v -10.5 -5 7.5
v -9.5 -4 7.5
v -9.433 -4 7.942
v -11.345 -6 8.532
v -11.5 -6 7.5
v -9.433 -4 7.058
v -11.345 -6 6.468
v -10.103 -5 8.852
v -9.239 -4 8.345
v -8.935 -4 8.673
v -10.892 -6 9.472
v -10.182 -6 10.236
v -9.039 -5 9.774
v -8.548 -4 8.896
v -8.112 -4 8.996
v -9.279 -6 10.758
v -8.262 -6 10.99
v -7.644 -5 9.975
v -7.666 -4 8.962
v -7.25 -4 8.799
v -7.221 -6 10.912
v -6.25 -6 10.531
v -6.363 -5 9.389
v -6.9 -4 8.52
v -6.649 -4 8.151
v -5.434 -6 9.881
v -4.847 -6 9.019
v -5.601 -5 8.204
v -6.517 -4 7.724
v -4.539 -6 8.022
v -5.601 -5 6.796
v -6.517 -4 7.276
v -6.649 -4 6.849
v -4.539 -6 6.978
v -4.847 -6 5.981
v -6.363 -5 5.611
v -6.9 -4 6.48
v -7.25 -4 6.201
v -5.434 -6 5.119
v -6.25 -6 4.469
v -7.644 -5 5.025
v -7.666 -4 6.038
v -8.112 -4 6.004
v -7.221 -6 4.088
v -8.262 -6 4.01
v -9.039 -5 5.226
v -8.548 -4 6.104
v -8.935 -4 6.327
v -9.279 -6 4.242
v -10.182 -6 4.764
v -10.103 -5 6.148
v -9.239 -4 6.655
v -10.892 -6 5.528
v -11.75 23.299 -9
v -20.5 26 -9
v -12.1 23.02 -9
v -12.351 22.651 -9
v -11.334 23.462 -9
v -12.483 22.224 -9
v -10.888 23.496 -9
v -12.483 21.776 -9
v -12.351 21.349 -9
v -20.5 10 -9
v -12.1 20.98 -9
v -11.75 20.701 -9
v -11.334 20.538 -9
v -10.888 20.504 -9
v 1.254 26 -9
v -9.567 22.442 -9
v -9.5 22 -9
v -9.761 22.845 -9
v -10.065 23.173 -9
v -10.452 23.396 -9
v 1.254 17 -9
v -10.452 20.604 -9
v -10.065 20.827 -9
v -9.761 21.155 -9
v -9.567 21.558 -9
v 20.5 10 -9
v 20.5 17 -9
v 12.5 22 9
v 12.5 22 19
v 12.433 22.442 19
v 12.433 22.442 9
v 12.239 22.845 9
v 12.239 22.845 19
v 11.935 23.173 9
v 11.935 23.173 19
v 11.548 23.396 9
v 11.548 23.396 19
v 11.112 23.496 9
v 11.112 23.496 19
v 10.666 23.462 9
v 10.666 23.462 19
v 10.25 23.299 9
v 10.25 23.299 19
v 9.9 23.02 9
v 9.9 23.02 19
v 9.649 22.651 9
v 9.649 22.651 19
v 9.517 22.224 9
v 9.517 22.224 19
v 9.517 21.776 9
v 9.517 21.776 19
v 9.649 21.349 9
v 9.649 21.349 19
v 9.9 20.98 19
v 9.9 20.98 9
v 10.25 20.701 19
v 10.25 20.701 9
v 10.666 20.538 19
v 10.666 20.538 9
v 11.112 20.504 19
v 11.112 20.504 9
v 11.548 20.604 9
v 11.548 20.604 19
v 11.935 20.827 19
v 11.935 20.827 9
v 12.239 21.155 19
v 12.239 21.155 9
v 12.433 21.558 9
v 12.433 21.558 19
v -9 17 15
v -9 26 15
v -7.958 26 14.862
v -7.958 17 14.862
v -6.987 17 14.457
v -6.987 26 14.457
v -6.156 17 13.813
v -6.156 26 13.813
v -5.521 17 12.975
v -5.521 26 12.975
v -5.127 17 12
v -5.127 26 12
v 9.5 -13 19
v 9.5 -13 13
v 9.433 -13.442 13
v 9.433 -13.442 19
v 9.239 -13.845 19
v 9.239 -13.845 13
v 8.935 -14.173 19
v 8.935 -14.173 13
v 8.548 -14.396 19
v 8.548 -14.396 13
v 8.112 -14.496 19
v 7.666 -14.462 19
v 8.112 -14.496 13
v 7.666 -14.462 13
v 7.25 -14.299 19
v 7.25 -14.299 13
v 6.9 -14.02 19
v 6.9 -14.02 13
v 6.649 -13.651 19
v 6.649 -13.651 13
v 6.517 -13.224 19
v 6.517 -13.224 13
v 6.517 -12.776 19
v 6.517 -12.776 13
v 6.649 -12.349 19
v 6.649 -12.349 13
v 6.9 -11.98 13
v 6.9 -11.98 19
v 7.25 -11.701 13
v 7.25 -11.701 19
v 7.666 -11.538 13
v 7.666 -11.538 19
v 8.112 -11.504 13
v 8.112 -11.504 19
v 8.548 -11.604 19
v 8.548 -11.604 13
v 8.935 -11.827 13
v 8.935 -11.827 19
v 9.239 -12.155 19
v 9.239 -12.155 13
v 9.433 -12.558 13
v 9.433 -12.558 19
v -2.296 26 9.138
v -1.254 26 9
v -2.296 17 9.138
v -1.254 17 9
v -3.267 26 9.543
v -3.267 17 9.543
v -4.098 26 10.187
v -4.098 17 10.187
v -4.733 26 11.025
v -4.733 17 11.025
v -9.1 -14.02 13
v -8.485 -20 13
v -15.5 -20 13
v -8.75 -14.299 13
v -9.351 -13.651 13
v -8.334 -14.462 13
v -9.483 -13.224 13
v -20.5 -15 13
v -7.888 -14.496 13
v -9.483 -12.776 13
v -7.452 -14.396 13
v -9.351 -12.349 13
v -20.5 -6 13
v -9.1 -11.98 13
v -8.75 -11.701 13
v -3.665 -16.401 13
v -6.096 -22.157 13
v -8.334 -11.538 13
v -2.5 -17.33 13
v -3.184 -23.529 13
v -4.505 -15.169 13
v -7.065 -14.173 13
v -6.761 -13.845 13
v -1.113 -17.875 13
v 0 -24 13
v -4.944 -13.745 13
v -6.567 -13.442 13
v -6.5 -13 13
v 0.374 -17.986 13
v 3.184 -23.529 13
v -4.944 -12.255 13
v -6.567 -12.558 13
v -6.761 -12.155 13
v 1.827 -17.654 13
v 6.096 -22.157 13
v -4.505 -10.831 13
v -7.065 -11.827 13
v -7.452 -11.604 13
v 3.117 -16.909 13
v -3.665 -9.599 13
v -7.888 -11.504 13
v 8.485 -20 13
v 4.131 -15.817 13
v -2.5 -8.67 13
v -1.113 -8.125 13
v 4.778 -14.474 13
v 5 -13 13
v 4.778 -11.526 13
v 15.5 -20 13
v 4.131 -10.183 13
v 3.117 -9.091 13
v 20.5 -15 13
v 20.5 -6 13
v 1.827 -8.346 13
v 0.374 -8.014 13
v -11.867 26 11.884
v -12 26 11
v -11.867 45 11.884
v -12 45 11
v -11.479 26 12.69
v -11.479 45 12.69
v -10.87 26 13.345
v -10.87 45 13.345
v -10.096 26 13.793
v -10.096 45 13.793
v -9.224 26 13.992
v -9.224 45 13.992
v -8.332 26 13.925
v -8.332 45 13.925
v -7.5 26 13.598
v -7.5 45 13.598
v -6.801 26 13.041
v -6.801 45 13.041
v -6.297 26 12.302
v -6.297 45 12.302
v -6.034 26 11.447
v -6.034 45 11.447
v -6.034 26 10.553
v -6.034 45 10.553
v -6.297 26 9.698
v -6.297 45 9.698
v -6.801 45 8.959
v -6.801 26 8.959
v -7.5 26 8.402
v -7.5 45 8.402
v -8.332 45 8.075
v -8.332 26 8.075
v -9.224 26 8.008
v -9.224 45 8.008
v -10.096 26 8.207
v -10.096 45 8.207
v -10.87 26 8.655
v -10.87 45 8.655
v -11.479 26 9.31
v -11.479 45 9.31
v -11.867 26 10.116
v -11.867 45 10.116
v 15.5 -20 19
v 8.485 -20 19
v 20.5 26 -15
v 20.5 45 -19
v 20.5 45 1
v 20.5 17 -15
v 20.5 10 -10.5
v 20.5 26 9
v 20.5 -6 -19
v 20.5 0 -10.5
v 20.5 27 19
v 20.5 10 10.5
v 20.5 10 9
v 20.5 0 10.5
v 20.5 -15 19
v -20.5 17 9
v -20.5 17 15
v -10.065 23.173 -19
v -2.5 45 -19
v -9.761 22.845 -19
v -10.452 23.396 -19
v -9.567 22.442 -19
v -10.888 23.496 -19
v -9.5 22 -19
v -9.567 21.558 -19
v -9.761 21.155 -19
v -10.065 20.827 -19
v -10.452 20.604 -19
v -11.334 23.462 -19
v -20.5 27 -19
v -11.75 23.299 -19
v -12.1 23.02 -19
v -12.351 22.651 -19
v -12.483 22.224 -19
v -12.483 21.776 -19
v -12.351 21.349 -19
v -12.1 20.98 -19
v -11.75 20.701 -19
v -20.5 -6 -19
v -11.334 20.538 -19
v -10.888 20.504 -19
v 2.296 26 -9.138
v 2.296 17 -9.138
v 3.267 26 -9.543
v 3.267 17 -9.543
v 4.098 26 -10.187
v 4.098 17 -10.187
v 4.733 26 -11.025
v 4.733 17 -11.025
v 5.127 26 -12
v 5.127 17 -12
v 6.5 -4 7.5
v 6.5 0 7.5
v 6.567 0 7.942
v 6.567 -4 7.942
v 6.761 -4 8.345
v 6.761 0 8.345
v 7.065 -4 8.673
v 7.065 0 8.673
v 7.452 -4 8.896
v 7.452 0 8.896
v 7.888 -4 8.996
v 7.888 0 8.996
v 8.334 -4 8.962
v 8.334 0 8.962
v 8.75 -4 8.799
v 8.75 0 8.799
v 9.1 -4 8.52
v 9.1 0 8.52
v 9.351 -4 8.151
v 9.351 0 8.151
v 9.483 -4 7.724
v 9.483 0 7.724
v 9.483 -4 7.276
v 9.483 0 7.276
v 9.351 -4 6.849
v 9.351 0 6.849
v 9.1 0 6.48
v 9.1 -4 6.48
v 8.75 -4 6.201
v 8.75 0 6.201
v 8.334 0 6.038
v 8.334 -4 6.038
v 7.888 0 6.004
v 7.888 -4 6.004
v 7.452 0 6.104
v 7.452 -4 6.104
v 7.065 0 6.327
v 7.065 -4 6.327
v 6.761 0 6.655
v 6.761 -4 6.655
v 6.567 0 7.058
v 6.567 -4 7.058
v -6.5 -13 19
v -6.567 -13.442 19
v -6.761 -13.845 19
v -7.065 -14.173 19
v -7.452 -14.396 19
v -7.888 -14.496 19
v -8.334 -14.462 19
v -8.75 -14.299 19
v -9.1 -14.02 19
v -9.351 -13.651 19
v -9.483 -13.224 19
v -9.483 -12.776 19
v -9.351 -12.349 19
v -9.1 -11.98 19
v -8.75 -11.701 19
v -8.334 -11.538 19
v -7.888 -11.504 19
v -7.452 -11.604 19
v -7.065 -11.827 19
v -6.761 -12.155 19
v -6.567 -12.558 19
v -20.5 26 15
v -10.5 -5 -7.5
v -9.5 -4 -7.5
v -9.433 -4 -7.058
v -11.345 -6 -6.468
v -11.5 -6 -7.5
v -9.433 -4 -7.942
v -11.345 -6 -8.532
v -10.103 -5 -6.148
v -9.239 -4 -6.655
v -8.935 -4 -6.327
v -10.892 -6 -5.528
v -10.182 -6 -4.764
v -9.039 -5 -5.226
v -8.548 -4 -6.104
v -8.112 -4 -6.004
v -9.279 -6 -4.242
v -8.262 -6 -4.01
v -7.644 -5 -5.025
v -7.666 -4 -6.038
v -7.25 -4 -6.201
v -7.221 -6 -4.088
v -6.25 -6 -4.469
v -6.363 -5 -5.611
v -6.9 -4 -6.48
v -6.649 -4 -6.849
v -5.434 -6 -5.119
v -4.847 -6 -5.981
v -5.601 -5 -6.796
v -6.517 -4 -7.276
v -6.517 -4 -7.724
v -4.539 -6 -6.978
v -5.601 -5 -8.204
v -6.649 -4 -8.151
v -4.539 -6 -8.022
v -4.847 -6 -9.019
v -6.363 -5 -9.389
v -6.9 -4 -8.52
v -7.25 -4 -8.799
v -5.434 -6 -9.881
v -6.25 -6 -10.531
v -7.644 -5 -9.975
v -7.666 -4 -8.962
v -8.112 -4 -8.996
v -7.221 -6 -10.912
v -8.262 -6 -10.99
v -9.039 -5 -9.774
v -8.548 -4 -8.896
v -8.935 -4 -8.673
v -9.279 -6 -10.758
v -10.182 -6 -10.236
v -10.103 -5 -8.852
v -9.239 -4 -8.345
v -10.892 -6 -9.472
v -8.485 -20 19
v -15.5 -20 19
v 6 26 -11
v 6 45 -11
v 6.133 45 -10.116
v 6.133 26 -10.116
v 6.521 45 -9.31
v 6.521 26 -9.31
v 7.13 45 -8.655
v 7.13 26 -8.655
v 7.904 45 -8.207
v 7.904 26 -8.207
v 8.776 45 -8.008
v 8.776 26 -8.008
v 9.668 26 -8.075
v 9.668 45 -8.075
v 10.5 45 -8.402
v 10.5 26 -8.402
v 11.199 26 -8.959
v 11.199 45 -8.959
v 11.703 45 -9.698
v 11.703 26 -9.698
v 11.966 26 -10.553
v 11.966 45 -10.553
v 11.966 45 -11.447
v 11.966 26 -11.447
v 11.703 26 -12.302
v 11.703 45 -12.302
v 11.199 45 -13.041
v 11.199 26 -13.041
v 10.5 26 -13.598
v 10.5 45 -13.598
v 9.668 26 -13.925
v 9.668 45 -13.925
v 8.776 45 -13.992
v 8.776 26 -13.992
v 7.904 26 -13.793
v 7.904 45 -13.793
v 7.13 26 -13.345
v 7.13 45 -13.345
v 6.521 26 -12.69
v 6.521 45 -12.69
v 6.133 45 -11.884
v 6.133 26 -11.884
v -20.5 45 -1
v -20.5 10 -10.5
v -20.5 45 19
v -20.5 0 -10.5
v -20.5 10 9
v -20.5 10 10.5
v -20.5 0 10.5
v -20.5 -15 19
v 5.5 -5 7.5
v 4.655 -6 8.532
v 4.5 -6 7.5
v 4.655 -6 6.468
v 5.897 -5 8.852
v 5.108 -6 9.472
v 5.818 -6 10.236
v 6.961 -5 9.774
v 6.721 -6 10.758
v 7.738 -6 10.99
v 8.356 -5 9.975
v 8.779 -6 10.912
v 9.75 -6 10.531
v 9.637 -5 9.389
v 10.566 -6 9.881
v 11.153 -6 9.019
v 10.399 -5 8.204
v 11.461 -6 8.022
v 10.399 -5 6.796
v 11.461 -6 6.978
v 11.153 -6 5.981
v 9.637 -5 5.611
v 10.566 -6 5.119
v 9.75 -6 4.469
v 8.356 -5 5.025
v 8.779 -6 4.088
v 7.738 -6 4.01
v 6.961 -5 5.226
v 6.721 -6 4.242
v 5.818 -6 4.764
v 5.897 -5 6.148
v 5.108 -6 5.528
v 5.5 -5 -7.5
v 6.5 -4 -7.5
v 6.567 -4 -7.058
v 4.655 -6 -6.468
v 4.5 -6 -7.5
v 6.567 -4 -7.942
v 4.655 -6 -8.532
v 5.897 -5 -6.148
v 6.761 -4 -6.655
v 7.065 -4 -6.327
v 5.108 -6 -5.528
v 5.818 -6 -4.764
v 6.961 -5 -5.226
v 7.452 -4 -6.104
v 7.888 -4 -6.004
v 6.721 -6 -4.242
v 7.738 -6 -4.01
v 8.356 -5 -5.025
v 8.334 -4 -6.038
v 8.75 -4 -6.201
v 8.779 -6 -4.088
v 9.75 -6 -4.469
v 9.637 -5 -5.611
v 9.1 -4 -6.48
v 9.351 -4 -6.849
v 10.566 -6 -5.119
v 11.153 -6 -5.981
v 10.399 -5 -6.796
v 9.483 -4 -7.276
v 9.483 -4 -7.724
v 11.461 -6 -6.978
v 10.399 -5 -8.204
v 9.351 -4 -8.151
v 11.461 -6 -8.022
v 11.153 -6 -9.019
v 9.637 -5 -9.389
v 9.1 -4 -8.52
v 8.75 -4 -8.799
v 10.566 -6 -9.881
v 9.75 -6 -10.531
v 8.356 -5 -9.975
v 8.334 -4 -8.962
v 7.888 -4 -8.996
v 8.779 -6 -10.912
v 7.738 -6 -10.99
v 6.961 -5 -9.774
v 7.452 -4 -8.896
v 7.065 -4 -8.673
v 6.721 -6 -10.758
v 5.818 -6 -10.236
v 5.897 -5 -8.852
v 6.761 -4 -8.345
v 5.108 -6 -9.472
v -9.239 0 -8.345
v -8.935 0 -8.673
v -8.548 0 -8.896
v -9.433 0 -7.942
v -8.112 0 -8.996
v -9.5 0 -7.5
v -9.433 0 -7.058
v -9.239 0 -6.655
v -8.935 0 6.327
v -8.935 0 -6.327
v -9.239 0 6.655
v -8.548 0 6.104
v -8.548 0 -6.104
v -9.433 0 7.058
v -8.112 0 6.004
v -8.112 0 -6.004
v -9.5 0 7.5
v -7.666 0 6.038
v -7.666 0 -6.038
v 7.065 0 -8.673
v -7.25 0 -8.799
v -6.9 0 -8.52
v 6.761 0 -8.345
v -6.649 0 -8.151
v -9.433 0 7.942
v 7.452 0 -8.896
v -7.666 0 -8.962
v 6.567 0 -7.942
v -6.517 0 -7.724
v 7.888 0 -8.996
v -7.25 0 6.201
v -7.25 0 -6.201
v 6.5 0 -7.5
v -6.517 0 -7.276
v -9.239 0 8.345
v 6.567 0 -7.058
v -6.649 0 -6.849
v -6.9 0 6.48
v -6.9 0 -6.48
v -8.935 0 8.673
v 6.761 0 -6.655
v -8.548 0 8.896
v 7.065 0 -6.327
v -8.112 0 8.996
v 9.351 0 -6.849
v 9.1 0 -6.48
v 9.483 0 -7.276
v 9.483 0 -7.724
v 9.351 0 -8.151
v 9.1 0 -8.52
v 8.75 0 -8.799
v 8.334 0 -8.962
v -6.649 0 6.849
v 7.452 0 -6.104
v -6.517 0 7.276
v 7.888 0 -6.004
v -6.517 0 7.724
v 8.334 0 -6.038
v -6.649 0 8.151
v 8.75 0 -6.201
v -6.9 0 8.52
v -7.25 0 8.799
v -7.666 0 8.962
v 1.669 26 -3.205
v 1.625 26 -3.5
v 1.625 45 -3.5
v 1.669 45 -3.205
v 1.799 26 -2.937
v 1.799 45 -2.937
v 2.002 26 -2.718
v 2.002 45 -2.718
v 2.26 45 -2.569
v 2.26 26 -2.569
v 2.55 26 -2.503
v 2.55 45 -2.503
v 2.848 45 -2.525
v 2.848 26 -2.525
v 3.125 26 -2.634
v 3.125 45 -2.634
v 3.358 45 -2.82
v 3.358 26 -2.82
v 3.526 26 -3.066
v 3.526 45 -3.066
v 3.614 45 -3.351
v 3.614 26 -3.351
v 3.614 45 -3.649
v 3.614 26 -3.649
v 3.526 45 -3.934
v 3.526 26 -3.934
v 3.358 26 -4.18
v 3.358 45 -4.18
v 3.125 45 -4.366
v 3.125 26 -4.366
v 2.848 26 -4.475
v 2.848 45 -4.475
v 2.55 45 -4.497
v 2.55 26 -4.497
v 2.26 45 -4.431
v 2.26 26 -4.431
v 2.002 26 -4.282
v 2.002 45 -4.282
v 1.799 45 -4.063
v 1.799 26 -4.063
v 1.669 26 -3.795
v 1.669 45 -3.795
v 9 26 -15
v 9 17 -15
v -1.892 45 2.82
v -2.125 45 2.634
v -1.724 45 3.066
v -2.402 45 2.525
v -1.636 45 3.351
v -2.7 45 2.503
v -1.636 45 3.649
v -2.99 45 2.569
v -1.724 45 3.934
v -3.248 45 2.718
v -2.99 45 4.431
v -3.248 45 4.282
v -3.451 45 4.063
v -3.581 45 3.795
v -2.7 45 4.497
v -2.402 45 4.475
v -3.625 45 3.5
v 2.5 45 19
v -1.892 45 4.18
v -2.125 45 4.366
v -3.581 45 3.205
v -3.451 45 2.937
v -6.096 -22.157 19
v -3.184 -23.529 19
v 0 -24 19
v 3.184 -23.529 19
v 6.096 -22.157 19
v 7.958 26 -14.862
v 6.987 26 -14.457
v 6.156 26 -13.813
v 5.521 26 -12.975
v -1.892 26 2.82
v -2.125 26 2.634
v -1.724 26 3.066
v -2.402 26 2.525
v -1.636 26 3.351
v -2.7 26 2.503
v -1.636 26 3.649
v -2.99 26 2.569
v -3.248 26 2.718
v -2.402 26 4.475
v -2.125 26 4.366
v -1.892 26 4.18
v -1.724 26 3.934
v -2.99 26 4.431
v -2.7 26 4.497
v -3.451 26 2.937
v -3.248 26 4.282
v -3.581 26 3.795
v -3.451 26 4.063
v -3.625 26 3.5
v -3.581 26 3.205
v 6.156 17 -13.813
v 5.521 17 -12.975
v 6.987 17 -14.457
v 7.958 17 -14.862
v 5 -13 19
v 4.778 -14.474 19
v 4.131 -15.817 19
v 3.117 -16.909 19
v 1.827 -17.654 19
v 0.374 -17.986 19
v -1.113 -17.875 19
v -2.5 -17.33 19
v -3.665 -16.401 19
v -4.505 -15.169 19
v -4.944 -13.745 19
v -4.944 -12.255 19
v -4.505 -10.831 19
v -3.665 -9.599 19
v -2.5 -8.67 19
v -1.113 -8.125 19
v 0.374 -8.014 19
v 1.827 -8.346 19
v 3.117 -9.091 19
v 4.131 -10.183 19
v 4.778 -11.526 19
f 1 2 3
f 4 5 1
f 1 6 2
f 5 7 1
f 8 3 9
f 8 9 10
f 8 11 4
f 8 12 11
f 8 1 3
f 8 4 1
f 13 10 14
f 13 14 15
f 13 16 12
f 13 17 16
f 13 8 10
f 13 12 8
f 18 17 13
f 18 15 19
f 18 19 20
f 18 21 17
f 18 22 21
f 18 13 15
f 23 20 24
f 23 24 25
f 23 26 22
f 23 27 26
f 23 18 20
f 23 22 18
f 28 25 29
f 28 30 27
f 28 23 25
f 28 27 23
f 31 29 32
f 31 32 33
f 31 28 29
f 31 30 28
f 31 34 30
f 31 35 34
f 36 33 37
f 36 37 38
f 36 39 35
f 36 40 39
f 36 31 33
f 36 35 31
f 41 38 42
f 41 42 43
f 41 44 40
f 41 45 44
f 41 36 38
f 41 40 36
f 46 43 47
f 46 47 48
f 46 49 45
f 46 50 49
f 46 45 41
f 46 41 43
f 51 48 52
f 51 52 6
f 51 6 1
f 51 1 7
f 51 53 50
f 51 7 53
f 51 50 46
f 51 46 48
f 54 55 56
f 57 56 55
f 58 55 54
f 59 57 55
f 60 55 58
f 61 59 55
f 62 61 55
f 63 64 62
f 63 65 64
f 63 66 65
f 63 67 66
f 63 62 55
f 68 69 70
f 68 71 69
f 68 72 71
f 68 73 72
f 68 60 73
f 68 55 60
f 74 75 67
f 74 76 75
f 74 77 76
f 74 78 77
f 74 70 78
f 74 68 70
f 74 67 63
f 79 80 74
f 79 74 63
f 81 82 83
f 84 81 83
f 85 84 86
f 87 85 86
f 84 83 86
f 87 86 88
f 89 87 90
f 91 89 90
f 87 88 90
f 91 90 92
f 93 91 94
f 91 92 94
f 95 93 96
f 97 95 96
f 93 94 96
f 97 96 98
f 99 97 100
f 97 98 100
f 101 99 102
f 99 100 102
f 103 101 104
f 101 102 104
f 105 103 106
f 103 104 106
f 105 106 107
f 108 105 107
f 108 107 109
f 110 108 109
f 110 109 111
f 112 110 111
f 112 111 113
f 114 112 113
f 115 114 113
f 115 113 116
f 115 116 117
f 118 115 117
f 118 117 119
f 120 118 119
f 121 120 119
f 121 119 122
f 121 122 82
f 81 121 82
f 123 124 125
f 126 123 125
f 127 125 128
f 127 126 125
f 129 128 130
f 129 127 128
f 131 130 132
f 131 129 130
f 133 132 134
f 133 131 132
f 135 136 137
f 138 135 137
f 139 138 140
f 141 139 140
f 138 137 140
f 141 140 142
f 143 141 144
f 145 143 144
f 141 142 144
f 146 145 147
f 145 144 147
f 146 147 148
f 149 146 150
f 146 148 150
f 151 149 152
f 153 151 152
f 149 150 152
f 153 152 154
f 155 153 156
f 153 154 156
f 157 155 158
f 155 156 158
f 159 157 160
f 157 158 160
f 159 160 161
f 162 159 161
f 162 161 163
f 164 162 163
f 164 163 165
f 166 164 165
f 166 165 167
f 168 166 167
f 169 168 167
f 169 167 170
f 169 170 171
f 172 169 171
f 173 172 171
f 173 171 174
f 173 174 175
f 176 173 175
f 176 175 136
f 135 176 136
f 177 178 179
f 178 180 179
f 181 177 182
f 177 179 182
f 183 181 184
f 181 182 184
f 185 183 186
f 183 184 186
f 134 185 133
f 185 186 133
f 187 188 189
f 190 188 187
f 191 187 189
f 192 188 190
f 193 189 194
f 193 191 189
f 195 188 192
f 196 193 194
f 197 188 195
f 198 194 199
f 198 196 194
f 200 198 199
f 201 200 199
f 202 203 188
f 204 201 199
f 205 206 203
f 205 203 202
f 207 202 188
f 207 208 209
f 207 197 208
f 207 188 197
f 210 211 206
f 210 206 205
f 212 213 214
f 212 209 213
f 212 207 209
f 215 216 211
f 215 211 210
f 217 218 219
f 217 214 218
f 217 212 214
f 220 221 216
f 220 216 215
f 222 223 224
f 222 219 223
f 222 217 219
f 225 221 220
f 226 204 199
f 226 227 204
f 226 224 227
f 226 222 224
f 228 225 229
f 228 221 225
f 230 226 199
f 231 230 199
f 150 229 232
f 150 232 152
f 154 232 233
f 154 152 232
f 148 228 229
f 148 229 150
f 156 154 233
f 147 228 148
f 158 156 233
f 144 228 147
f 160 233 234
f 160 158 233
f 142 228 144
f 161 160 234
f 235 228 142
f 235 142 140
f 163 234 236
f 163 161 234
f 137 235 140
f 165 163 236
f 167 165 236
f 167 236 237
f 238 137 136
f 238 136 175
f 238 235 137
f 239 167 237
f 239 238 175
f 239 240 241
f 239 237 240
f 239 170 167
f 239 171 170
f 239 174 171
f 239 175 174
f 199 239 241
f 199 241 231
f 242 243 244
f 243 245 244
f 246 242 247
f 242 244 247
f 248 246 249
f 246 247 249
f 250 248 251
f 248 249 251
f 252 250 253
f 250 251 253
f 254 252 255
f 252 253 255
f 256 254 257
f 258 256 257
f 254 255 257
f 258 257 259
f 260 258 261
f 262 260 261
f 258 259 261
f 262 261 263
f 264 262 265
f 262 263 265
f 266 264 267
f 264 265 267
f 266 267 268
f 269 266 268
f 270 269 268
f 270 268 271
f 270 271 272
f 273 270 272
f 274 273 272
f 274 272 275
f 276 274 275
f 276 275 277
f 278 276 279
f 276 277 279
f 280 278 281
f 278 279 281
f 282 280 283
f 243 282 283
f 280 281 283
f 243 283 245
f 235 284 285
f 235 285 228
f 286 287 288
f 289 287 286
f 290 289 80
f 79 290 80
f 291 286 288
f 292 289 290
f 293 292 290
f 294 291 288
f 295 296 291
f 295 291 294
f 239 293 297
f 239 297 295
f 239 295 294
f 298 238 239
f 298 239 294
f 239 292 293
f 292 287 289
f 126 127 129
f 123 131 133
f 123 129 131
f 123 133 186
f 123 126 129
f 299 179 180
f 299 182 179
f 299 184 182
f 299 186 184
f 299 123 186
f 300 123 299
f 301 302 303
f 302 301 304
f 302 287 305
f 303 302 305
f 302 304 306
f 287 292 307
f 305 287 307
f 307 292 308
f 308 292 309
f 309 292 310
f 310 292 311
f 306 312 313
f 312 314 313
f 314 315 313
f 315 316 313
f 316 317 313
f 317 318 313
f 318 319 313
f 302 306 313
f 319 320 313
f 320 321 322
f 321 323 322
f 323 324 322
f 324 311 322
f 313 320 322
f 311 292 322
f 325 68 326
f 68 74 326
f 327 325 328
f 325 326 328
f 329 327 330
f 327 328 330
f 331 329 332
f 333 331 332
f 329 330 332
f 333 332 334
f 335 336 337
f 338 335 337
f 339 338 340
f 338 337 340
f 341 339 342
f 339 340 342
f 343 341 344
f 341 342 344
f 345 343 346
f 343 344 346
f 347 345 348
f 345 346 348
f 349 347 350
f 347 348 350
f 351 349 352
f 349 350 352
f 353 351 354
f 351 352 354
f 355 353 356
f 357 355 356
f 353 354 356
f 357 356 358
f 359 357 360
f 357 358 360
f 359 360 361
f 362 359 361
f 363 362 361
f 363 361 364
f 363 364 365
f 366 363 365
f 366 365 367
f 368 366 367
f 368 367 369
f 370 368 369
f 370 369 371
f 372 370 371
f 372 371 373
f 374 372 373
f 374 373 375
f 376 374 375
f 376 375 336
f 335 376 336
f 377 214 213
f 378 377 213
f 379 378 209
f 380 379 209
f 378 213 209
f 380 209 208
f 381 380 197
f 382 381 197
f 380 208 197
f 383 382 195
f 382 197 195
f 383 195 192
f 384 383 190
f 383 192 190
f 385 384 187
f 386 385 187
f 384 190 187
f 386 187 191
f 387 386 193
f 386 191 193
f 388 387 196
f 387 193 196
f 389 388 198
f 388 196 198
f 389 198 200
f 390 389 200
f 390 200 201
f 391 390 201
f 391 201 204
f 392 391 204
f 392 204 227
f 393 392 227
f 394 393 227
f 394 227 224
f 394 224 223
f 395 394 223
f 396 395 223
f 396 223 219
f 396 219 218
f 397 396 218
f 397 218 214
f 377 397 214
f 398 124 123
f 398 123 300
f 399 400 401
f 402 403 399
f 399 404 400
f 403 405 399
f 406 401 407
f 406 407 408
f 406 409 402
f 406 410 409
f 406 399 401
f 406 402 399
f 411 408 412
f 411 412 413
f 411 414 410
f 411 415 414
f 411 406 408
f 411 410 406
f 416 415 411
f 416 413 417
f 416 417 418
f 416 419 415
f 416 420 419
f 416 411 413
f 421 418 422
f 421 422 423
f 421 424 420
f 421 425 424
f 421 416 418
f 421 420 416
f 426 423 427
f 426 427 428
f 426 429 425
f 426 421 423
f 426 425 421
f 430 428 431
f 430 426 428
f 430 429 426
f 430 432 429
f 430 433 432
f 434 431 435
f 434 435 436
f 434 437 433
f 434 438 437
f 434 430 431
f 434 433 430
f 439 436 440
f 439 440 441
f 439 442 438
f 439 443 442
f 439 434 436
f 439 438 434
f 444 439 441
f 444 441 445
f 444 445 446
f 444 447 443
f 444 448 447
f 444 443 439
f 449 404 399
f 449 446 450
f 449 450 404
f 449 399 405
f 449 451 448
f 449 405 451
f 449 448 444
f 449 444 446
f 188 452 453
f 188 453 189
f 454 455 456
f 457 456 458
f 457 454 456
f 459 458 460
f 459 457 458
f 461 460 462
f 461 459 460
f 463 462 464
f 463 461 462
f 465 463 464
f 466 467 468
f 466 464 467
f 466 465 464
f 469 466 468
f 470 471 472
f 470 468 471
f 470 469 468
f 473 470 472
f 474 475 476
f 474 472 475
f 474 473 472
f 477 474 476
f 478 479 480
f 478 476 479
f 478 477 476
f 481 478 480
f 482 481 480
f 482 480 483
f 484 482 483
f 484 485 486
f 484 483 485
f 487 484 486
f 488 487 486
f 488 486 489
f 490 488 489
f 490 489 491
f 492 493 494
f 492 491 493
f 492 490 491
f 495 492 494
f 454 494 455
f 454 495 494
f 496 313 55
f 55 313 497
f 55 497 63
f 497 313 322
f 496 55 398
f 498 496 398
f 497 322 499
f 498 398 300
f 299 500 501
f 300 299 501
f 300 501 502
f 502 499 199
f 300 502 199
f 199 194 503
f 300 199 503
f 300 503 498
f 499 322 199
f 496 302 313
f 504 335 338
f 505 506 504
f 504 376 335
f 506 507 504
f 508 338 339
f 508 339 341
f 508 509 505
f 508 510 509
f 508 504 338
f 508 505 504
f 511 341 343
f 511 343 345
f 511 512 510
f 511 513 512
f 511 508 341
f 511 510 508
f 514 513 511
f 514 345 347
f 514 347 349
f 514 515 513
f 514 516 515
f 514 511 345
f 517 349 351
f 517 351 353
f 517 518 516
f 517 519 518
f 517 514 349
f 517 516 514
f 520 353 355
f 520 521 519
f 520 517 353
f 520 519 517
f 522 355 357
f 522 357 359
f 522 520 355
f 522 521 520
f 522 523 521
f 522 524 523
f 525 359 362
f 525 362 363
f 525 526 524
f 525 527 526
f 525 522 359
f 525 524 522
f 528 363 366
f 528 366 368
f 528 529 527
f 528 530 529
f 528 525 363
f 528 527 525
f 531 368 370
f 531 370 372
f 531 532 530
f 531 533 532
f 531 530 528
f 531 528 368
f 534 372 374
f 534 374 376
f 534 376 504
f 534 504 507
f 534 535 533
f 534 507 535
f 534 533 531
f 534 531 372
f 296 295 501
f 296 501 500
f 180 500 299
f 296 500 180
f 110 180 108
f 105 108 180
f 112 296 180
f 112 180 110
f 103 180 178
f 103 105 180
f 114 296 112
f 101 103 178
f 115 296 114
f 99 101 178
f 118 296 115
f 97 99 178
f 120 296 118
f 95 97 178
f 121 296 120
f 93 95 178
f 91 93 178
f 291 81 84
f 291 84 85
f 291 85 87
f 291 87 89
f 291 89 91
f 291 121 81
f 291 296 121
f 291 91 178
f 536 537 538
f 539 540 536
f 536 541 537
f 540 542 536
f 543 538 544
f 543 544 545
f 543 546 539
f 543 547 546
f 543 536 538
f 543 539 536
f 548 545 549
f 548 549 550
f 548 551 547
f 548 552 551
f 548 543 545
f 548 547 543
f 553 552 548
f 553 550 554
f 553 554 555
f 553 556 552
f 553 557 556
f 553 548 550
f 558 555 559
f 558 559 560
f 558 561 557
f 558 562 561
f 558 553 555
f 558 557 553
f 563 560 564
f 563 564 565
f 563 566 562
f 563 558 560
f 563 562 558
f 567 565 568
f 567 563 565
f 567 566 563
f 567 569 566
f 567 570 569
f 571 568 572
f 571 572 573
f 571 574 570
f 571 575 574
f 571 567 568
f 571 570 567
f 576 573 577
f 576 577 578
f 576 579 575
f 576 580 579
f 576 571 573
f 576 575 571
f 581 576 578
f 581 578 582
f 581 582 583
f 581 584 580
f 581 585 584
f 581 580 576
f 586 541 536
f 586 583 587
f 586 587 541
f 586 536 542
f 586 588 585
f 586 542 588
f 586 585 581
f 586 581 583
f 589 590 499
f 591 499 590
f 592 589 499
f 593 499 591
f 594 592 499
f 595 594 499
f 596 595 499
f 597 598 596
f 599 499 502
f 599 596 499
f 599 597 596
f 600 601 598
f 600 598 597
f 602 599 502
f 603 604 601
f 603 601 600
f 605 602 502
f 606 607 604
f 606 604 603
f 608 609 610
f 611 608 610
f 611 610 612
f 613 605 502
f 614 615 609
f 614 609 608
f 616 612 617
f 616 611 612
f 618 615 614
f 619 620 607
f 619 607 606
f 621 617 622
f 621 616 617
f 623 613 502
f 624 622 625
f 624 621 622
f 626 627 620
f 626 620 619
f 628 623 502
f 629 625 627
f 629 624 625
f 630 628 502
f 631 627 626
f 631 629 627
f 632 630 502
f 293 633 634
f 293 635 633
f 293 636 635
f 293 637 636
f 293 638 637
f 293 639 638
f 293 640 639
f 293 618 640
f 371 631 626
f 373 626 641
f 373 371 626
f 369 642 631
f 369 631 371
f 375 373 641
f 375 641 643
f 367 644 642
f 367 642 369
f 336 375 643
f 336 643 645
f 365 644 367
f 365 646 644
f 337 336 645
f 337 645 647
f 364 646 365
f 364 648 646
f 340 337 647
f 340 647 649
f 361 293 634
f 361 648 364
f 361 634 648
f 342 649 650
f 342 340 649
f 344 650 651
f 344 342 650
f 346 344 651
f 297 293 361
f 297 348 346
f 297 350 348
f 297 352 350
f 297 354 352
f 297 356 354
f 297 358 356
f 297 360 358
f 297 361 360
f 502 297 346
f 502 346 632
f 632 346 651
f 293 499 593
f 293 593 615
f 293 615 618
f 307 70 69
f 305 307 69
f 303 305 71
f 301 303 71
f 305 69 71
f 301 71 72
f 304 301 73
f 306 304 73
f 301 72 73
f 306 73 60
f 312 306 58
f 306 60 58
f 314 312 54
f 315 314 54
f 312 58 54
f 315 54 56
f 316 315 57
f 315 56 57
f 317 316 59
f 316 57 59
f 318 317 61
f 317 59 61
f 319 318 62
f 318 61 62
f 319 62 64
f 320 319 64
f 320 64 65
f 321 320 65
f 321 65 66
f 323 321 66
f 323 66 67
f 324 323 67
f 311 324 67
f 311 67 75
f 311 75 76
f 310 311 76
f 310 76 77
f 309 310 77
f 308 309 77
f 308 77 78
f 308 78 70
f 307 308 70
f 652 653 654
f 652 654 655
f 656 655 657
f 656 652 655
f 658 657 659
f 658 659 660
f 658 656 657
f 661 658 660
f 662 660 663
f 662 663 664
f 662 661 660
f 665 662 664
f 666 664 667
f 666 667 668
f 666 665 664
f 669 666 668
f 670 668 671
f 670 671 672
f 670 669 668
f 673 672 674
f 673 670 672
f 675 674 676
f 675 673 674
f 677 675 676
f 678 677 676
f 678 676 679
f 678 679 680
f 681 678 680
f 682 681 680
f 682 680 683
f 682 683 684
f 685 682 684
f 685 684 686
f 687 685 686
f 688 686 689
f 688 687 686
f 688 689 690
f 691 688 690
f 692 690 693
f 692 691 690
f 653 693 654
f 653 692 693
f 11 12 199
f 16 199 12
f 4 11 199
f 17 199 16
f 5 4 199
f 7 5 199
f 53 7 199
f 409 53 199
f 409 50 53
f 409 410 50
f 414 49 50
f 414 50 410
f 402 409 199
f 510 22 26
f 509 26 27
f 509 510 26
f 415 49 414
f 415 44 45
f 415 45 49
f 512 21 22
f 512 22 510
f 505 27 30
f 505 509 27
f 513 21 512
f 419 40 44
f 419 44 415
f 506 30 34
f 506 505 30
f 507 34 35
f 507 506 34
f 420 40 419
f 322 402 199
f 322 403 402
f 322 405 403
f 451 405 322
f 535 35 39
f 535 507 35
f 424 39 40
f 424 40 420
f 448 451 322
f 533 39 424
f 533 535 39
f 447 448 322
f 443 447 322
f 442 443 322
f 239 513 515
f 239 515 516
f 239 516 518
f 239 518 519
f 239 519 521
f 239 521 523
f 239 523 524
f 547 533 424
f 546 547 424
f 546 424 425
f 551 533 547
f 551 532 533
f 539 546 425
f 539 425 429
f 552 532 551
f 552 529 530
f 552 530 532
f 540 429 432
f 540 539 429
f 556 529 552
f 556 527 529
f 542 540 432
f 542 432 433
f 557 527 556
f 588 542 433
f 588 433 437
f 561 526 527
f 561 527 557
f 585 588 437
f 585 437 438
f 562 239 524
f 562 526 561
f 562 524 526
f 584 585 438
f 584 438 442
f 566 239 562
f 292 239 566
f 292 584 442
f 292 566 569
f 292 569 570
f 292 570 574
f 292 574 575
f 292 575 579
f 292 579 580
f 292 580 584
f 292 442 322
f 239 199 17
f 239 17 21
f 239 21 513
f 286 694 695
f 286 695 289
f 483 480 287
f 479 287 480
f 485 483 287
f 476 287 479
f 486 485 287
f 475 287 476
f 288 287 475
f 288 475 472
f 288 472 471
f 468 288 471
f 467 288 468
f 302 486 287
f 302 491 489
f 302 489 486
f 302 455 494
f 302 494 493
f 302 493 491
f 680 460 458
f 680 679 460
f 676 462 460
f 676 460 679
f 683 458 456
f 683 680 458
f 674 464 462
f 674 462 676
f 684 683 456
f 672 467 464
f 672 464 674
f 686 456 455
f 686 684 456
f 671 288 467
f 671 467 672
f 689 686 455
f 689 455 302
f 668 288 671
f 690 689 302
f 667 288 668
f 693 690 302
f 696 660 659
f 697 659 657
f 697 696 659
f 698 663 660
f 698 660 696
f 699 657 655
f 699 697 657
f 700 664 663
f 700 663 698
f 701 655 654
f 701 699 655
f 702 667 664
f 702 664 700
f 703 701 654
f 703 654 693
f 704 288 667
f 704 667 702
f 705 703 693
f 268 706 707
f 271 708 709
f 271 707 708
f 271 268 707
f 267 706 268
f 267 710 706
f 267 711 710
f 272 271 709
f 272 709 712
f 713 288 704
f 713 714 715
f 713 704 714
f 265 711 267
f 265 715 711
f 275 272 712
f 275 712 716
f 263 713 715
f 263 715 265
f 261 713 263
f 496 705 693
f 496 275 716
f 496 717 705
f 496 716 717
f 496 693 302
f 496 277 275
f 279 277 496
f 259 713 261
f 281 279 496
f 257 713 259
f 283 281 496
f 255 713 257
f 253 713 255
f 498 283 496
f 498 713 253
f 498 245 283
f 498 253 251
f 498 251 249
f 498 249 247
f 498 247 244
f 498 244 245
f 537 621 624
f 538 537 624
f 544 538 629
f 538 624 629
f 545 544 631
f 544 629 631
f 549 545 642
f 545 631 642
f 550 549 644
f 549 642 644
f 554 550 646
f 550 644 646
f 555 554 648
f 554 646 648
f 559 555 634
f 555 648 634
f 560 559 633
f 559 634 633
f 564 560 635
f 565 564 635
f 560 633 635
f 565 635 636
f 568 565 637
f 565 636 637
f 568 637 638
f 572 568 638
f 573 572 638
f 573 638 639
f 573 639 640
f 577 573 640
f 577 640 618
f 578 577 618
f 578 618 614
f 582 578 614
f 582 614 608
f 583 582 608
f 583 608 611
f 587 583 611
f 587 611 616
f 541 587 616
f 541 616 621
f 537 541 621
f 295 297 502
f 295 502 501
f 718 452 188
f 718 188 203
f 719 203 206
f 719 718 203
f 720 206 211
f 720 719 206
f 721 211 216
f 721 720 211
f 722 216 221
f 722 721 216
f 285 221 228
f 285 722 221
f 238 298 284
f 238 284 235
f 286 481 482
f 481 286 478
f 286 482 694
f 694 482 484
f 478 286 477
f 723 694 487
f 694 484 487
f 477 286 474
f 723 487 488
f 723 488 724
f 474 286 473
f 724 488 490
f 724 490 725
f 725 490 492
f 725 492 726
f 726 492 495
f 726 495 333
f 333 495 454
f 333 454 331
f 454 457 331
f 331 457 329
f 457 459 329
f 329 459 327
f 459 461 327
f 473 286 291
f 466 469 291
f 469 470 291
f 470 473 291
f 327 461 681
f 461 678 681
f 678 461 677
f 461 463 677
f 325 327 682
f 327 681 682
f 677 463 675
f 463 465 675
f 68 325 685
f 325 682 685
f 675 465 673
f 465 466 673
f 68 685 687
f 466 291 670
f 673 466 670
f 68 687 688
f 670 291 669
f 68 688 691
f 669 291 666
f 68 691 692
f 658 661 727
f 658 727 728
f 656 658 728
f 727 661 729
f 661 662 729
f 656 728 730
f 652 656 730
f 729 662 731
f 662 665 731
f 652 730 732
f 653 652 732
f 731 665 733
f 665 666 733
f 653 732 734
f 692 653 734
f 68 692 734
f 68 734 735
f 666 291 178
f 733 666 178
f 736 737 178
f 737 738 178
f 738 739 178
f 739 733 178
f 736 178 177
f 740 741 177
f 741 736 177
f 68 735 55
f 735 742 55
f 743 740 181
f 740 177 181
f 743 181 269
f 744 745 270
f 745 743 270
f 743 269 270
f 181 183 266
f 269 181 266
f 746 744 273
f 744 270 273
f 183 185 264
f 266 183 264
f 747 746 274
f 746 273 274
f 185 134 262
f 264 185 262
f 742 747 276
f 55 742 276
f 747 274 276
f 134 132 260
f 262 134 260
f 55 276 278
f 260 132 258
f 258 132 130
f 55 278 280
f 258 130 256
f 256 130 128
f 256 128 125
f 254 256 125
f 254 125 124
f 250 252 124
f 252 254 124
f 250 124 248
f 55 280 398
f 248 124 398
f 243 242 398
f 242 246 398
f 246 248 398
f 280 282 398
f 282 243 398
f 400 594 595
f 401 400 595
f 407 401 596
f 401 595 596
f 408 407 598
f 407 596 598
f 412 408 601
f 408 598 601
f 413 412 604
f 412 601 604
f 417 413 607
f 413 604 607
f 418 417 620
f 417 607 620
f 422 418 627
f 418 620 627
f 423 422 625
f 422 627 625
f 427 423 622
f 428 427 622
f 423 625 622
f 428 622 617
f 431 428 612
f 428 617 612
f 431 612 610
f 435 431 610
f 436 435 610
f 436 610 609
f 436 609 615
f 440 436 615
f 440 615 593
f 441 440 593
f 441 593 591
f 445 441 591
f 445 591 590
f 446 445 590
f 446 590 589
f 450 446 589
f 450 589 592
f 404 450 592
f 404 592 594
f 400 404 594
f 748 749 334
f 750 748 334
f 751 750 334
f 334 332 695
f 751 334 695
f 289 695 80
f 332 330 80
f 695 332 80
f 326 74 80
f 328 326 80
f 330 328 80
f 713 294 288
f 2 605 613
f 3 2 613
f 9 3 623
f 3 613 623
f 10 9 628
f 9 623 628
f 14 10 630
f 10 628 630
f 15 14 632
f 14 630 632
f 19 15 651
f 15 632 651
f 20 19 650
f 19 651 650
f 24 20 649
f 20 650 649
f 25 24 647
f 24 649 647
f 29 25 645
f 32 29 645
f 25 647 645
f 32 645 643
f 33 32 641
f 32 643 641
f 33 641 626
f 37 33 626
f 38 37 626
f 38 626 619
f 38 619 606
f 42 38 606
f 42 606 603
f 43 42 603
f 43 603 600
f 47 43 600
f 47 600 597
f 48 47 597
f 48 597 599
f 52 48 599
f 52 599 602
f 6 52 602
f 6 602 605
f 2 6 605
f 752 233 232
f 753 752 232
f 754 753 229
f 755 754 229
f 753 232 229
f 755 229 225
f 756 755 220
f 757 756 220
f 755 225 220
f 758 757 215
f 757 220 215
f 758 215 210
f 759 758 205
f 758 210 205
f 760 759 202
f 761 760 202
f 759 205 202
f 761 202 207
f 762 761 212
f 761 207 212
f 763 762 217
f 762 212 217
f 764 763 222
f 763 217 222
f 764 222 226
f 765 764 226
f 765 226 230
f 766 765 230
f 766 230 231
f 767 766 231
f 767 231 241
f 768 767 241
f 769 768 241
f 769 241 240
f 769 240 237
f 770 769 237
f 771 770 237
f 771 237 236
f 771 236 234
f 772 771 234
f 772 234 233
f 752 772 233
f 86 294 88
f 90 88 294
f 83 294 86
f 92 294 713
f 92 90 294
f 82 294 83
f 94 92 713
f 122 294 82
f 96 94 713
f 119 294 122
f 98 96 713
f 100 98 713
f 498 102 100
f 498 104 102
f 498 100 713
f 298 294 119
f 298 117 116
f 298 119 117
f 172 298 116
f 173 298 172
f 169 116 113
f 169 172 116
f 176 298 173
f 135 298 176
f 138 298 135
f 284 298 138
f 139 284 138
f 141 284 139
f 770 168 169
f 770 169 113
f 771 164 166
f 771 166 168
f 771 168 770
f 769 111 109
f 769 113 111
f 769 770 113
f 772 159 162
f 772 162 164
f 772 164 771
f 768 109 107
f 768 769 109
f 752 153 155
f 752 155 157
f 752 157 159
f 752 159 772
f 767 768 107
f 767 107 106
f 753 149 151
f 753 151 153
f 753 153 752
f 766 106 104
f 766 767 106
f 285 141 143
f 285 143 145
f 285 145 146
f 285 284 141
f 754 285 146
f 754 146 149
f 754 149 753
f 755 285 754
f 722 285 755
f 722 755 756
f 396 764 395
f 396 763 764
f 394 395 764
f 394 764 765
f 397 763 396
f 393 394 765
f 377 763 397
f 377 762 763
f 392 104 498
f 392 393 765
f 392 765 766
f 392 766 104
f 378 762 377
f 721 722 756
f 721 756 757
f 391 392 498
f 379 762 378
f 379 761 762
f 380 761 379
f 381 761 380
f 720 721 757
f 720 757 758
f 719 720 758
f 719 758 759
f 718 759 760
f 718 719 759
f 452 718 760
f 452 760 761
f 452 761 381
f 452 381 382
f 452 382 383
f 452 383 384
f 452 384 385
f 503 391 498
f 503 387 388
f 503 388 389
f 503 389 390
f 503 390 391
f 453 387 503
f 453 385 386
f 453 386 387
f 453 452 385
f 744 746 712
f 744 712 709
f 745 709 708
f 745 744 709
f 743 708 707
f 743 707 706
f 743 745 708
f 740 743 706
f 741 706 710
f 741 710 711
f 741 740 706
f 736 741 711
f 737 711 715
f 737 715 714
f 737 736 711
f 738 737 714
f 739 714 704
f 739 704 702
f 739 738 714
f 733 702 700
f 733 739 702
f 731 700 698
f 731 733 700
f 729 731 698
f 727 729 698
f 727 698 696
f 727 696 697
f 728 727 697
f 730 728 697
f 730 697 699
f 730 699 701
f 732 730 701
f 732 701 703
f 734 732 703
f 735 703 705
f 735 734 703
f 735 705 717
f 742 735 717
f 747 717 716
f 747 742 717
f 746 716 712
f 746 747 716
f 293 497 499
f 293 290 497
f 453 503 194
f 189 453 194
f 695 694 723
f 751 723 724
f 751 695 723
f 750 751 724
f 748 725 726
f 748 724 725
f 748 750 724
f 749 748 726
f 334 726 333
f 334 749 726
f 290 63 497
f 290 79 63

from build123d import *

# Parameters (mm, degrees)
F1_DEPTH  = 20.5
F2_R      = 1.5
F2_R_2    = 5
F3_DEPTH  = 6.001
F5_DEPTH  = 6
F6_R      = 1.5
F7_DEPTH  = 24.001
F8_SIZE   = 2
F9_R      = 1.5
F10_DEPTH = 38.001
F11_W     = 41
F11_H     = 38
F11_R     = 3
F11_R_2   = 1
F12_DEPTH = 19
F13_R     = 3
F14_DEPTH = 28
F16_DEPTH = 28
F17_R     = 4
F18_DEPTH = 9
F19_W     = 18
F19_H     = 18
F20_DEPTH = 18
F21_SIZE  = 17.99999
F22_SIZE  = 5
F24_DEPTH = 9
F25_R     = 4


# Not quite as in the source:
# - a fillet or chamfer is up to 0.001 mm smaller than in the source, because OpenCascade refuses the exact size


with BuildPart() as f1:
    # F0 (on Right) → F1 (new body, symmetric)
    with BuildSketch(Plane.YZ):
        Polygon((0, -10.5), (0, 10.5), (10, 10.5), (10, 9), (26, 9), (26, 19), (-20, 19), (-20, 13), (-6, 13), (-6, -19), (26, -19), (26, -9), (10, -9), (10, -10.5), align=None)
    extrude(amount=F1_DEPTH, both=True)

    # F2 (on face) → F3 (cut, through all)
    with BuildSketch(Plane(origin=(0, 0, 13), x_dir=(1, 0, 0), z_dir=(0, 0, -1))):
        with Locations((-8, 13)):
            Circle(F2_R)
        with Locations((8, 13)):
            Circle(F2_R)
        with Locations((0, 13)):
            Circle(F2_R_2)
    extrude(amount=-F3_DEPTH, mode=Mode.SUBTRACT)

    # F4 (on face) → F5 (join, through all)
    with BuildSketch(Plane.XY.offset(19)):
        with BuildLine():
            ThreePointArc((-8.4852813742, -20), (0, -24), (8.4852813742, -20))
            Line((8.4852813742, -20), (-8.4852813742, -20))
        make_face()
    extrude(amount=-F5_DEPTH)

    # F6 (on face) → F7 (cut, through all)
    with BuildSketch(Plane(origin=(0, 0, 0), x_dir=(-1, 0, 0), z_dir=(0, 1, 0))):
        with Locations((-8, 7.5)):
            Circle(F6_R)
        with Locations((8, 7.5)):
            Circle(F6_R)
        with Locations((8, -7.5)):
            Circle(F6_R)
        with Locations((-8, -7.5)):
            Circle(F6_R)
    extrude(amount=-F7_DEPTH, mode=Mode.SUBTRACT)

    # F8
    f8_edges = [f1.edges().sort_by_distance(p)[0] for p in [
        (-6.5, -6, 7.5),
        (9.5, -6, 7.5),
        (9.5, -6, -7.5),
        (-6.5, -6, -7.5),
    ]]
    chamfer(f8_edges, length=F8_SIZE)

    # F9 (on face) → F10 (cut, through all)
    with BuildSketch(Plane.XY.offset(19)):
        with Locations((-11, 22)):
            Circle(F9_R)
        with Locations((11, 22)):
            Circle(F9_R)
    extrude(amount=-F10_DEPTH, mode=Mode.SUBTRACT)

    # F11 (on face) → F12 (join)
    with BuildSketch(Plane(origin=(0, 26, 0), x_dir=(-1, 0, 0), z_dir=(0, 1, 0))):
        Rectangle(F11_W, F11_H)
        with Locations((-9, -11)):
            Circle(F11_R, mode=Mode.SUBTRACT)
        with Locations((-2.625, -3.5)):
            Circle(F11_R_2, mode=Mode.SUBTRACT)
        with Locations((2.625, 3.5)):
            Circle(F11_R_2, mode=Mode.SUBTRACT)
        with Locations((9, 11)):
            Circle(F11_R, mode=Mode.SUBTRACT)
    extrude(amount=F12_DEPTH)

    # F13 (on face) → F14 (cut)
    with BuildSketch(Plane(origin=(0, 45, 0), x_dir=(-1, 0, 0), z_dir=(0, 1, 0))):
        with Locations((9, 11)):
            Circle(F13_R)
        with Locations((-9, -11)):
            Circle(F13_R)
    extrude(amount=-F14_DEPTH, mode=Mode.SUBTRACT)

    # F15 (on face) → F16 (join, through all)
    with BuildSketch(Plane(origin=(0, 17, 0), x_dir=(-1, 0, 0), z_dir=(0, 1, 0))):
        with BuildLine():
            ThreePointArc((6.7639320225, 9), (9, 14), (11.2360679775, 9))
            Line((11.2360679775, 9), (20.5, 9))
            Line((20.5, 9), (20.5, 19))
            Line((20.5, 19), (0, 19))
            Line((0, 19), (0, 9))
            Line((0, 9), (6.7639320225, 9))
        make_face()
        with BuildLine():
            ThreePointArc((-6.7639320225, -9), (-9, -14), (-11.2360679775, -9))
            Line((-11.2360679775, -9), (-20.5, -9))
            Line((-20.5, -9), (-20.5, -19))
            Line((-20.5, -19), (0, -19))
            Line((0, -19), (0, -9))
            Line((0, -9), (-6.7639320225, -9))
        make_face()
    extrude(amount=F16_DEPTH)

    # F17 (on face) → F18 (cut, through all)
    with BuildSketch(Plane(origin=(0, 17, 0), x_dir=(-1, 0, 0), z_dir=(0, 1, 0))):
        with Locations((9, 11)):
            Circle(F17_R)
        with Locations((-9, -11)):
            Circle(F17_R)
    extrude(amount=F18_DEPTH, mode=Mode.SUBTRACT)

    # F19 (on face) → F20 (cut)
    with BuildSketch(Plane(origin=(0, 45, 0), x_dir=(-1, 0, 0), z_dir=(0, 1, 0))):
        with Locations((-11.5, 10)):
            Rectangle(F19_W, F19_H)
        with Locations((11.5, -10)):
            Rectangle(F19_W, F19_H)
    extrude(amount=-F20_DEPTH, mode=Mode.SUBTRACT)

    # F21 (size 18 in the source; OpenCascade refuses exactly that, so slightly less here)
    f21_edges = [f1.edges().sort_by_distance(p)[0] for p in [
        (2.5, 27, 10),
        (-2.5, 27, -10),
        (11.5, 27, 1),
        (2.5, 36, 1),
        (-2.5, 36, -1),
        (-11.5, 27, -1),
    ]]
    chamfer(f21_edges, length=F21_SIZE)

    # F22
    f22_edges = [f1.edges().sort_by_distance(p)[0] for p in [
        (20.5, -20, 16),
        (-20.5, -20, 16),
    ]]
    chamfer(f22_edges, length=F22_SIZE)

    # F23 (on face) → F24 (cut, through all)
    with BuildSketch(Plane.XZ.offset(-26)):
        with BuildLine():
            Line((20.5, -9), (12.4641016151, -9))
            ThreePointArc((12.4641016151, -9), (12.4641016151, -13), (9, -15))
            Line((9, -15), (20.5, -15))
            Line((20.5, -15), (20.5, -9))
        make_face()
        with BuildLine():
            Line((-20.5, 9), (-12.4641016151, 9))
            ThreePointArc((-12.4641016151, 9), (-12.4641016151, 13), (-9, 15))
            Line((-9, 15), (-20.5, 15))
            Line((-20.5, 15), (-20.5, 9))
        make_face()
    extrude(amount=F24_DEPTH, mode=Mode.SUBTRACT)

    # F25
    f25_edges = [f1.edges().sort_by_distance(p)[0] for p in [
        (-5.535898, 21.5, 9),
        (5.535898, 21.5, -9),
    ]]
    fillet(f25_edges, radius=F25_R)


solid = f1.part
